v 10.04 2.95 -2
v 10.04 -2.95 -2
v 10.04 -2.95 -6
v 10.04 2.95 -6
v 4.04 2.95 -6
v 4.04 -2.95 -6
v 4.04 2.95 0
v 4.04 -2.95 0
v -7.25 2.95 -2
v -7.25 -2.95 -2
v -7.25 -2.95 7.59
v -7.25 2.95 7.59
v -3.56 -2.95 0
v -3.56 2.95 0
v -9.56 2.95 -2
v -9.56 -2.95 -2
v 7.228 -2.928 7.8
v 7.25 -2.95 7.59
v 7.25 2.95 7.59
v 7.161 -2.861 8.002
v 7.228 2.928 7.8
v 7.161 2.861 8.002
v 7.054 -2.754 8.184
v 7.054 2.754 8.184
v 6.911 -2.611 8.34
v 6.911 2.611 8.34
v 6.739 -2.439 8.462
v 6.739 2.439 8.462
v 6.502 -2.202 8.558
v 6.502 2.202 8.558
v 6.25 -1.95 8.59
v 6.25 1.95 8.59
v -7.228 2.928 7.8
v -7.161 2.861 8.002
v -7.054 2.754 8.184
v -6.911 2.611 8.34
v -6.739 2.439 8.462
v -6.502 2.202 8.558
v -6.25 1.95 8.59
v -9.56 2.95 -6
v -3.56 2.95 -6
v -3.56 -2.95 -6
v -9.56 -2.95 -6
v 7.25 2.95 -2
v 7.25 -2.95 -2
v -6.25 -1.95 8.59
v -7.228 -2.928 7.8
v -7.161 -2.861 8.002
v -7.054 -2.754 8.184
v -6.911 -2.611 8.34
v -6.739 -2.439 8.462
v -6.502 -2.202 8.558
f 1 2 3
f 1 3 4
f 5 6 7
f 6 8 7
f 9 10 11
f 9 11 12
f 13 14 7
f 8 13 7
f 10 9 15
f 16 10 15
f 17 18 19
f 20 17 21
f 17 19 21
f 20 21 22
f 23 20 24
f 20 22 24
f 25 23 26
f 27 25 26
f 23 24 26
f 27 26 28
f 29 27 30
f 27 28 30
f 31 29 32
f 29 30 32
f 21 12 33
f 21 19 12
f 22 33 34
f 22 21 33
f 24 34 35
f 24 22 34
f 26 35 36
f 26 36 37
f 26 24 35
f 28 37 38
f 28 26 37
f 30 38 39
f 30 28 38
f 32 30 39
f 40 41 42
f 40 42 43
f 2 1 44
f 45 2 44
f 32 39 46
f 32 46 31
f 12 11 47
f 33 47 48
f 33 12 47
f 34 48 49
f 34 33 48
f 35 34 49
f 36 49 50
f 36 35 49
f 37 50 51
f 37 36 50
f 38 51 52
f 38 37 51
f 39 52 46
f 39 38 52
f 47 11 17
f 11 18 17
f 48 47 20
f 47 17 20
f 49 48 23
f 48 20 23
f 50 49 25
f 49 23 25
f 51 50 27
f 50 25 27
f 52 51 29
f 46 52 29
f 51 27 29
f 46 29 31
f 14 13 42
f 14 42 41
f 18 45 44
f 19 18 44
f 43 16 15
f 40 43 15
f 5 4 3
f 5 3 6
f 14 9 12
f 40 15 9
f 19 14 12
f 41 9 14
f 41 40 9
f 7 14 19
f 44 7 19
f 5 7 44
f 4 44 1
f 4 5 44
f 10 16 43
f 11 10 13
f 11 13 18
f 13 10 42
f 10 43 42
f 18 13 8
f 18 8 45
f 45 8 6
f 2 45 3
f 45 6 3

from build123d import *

# Parameters (mm, degrees)
SKETCH1_W           = 14.5
SKETCH1_H           = 5.9
BOSS_EXTRUDE1_DEPTH = 2.59
SKETCH2_W           = 3.689926182
SKETCH2_H           = 5.9
SKETCH2_W_2         = 3.210073818
BOSS_EXTRUDE2_DEPTH = 2
SKETCH5_W           = 6
SKETCH5_H           = 5.9
BOSS_EXTRUDE3_DEPTH = 4
SKETCH7_W           = 14.5
SKETCH7_H           = 5.9
BOSS_EXTRUDE5_DEPTH = 6
FILLET2_R           = 1


with BuildPart() as part:
    # Sketch1 → Boss-Extrude1 (new body)
    with BuildSketch(Plane.XY):
        Rectangle(SKETCH1_W, SKETCH1_H)
    extrude(amount=BOSS_EXTRUDE1_DEPTH)

    # Sketch2 → Boss-Extrude2 (add)
    with BuildSketch(Plane(origin=(0, 0, 0), x_dir=(-1, 0, 0), z_dir=(0, 0, -1))):
        with Locations((5.405036909, 0)):
            Rectangle(SKETCH2_W, SKETCH2_H)
        with Locations((-5.644963091, 0)):
            Rectangle(SKETCH2_W_2, SKETCH2_H)
    extrude(amount=BOSS_EXTRUDE2_DEPTH)

    # Sketch5 → Boss-Extrude3 (add)
    with BuildSketch(Plane(origin=(0, 0, -2), x_dir=(-1, 0, 0), z_dir=(0, 0, -1))):
        with Locations((-7.039926182, 0)):
            Rectangle(SKETCH5_W, SKETCH5_H)
        with Locations((6.560073818, 0)):
            Rectangle(SKETCH5_W, SKETCH5_H)
    extrude(amount=BOSS_EXTRUDE3_DEPTH)

    # Sketch7 → Boss-Extrude5 (add)
    with BuildSketch(Plane.XY.offset(2.59)):
        Rectangle(SKETCH7_W, SKETCH7_H)
    extrude(amount=BOSS_EXTRUDE5_DEPTH)

    # Fillet2
    fillet2_edges = [part.edges().sort_by_distance(p)[0] for p in [
        (0, 2.95, 8.59),
        (-7.25, 0, 8.59),
        (0, -2.95, 8.59),
        (7.25, 0, 8.59),
    ]]
    fillet(fillet2_edges, radius=FILLET2_R)


solid = part.part
